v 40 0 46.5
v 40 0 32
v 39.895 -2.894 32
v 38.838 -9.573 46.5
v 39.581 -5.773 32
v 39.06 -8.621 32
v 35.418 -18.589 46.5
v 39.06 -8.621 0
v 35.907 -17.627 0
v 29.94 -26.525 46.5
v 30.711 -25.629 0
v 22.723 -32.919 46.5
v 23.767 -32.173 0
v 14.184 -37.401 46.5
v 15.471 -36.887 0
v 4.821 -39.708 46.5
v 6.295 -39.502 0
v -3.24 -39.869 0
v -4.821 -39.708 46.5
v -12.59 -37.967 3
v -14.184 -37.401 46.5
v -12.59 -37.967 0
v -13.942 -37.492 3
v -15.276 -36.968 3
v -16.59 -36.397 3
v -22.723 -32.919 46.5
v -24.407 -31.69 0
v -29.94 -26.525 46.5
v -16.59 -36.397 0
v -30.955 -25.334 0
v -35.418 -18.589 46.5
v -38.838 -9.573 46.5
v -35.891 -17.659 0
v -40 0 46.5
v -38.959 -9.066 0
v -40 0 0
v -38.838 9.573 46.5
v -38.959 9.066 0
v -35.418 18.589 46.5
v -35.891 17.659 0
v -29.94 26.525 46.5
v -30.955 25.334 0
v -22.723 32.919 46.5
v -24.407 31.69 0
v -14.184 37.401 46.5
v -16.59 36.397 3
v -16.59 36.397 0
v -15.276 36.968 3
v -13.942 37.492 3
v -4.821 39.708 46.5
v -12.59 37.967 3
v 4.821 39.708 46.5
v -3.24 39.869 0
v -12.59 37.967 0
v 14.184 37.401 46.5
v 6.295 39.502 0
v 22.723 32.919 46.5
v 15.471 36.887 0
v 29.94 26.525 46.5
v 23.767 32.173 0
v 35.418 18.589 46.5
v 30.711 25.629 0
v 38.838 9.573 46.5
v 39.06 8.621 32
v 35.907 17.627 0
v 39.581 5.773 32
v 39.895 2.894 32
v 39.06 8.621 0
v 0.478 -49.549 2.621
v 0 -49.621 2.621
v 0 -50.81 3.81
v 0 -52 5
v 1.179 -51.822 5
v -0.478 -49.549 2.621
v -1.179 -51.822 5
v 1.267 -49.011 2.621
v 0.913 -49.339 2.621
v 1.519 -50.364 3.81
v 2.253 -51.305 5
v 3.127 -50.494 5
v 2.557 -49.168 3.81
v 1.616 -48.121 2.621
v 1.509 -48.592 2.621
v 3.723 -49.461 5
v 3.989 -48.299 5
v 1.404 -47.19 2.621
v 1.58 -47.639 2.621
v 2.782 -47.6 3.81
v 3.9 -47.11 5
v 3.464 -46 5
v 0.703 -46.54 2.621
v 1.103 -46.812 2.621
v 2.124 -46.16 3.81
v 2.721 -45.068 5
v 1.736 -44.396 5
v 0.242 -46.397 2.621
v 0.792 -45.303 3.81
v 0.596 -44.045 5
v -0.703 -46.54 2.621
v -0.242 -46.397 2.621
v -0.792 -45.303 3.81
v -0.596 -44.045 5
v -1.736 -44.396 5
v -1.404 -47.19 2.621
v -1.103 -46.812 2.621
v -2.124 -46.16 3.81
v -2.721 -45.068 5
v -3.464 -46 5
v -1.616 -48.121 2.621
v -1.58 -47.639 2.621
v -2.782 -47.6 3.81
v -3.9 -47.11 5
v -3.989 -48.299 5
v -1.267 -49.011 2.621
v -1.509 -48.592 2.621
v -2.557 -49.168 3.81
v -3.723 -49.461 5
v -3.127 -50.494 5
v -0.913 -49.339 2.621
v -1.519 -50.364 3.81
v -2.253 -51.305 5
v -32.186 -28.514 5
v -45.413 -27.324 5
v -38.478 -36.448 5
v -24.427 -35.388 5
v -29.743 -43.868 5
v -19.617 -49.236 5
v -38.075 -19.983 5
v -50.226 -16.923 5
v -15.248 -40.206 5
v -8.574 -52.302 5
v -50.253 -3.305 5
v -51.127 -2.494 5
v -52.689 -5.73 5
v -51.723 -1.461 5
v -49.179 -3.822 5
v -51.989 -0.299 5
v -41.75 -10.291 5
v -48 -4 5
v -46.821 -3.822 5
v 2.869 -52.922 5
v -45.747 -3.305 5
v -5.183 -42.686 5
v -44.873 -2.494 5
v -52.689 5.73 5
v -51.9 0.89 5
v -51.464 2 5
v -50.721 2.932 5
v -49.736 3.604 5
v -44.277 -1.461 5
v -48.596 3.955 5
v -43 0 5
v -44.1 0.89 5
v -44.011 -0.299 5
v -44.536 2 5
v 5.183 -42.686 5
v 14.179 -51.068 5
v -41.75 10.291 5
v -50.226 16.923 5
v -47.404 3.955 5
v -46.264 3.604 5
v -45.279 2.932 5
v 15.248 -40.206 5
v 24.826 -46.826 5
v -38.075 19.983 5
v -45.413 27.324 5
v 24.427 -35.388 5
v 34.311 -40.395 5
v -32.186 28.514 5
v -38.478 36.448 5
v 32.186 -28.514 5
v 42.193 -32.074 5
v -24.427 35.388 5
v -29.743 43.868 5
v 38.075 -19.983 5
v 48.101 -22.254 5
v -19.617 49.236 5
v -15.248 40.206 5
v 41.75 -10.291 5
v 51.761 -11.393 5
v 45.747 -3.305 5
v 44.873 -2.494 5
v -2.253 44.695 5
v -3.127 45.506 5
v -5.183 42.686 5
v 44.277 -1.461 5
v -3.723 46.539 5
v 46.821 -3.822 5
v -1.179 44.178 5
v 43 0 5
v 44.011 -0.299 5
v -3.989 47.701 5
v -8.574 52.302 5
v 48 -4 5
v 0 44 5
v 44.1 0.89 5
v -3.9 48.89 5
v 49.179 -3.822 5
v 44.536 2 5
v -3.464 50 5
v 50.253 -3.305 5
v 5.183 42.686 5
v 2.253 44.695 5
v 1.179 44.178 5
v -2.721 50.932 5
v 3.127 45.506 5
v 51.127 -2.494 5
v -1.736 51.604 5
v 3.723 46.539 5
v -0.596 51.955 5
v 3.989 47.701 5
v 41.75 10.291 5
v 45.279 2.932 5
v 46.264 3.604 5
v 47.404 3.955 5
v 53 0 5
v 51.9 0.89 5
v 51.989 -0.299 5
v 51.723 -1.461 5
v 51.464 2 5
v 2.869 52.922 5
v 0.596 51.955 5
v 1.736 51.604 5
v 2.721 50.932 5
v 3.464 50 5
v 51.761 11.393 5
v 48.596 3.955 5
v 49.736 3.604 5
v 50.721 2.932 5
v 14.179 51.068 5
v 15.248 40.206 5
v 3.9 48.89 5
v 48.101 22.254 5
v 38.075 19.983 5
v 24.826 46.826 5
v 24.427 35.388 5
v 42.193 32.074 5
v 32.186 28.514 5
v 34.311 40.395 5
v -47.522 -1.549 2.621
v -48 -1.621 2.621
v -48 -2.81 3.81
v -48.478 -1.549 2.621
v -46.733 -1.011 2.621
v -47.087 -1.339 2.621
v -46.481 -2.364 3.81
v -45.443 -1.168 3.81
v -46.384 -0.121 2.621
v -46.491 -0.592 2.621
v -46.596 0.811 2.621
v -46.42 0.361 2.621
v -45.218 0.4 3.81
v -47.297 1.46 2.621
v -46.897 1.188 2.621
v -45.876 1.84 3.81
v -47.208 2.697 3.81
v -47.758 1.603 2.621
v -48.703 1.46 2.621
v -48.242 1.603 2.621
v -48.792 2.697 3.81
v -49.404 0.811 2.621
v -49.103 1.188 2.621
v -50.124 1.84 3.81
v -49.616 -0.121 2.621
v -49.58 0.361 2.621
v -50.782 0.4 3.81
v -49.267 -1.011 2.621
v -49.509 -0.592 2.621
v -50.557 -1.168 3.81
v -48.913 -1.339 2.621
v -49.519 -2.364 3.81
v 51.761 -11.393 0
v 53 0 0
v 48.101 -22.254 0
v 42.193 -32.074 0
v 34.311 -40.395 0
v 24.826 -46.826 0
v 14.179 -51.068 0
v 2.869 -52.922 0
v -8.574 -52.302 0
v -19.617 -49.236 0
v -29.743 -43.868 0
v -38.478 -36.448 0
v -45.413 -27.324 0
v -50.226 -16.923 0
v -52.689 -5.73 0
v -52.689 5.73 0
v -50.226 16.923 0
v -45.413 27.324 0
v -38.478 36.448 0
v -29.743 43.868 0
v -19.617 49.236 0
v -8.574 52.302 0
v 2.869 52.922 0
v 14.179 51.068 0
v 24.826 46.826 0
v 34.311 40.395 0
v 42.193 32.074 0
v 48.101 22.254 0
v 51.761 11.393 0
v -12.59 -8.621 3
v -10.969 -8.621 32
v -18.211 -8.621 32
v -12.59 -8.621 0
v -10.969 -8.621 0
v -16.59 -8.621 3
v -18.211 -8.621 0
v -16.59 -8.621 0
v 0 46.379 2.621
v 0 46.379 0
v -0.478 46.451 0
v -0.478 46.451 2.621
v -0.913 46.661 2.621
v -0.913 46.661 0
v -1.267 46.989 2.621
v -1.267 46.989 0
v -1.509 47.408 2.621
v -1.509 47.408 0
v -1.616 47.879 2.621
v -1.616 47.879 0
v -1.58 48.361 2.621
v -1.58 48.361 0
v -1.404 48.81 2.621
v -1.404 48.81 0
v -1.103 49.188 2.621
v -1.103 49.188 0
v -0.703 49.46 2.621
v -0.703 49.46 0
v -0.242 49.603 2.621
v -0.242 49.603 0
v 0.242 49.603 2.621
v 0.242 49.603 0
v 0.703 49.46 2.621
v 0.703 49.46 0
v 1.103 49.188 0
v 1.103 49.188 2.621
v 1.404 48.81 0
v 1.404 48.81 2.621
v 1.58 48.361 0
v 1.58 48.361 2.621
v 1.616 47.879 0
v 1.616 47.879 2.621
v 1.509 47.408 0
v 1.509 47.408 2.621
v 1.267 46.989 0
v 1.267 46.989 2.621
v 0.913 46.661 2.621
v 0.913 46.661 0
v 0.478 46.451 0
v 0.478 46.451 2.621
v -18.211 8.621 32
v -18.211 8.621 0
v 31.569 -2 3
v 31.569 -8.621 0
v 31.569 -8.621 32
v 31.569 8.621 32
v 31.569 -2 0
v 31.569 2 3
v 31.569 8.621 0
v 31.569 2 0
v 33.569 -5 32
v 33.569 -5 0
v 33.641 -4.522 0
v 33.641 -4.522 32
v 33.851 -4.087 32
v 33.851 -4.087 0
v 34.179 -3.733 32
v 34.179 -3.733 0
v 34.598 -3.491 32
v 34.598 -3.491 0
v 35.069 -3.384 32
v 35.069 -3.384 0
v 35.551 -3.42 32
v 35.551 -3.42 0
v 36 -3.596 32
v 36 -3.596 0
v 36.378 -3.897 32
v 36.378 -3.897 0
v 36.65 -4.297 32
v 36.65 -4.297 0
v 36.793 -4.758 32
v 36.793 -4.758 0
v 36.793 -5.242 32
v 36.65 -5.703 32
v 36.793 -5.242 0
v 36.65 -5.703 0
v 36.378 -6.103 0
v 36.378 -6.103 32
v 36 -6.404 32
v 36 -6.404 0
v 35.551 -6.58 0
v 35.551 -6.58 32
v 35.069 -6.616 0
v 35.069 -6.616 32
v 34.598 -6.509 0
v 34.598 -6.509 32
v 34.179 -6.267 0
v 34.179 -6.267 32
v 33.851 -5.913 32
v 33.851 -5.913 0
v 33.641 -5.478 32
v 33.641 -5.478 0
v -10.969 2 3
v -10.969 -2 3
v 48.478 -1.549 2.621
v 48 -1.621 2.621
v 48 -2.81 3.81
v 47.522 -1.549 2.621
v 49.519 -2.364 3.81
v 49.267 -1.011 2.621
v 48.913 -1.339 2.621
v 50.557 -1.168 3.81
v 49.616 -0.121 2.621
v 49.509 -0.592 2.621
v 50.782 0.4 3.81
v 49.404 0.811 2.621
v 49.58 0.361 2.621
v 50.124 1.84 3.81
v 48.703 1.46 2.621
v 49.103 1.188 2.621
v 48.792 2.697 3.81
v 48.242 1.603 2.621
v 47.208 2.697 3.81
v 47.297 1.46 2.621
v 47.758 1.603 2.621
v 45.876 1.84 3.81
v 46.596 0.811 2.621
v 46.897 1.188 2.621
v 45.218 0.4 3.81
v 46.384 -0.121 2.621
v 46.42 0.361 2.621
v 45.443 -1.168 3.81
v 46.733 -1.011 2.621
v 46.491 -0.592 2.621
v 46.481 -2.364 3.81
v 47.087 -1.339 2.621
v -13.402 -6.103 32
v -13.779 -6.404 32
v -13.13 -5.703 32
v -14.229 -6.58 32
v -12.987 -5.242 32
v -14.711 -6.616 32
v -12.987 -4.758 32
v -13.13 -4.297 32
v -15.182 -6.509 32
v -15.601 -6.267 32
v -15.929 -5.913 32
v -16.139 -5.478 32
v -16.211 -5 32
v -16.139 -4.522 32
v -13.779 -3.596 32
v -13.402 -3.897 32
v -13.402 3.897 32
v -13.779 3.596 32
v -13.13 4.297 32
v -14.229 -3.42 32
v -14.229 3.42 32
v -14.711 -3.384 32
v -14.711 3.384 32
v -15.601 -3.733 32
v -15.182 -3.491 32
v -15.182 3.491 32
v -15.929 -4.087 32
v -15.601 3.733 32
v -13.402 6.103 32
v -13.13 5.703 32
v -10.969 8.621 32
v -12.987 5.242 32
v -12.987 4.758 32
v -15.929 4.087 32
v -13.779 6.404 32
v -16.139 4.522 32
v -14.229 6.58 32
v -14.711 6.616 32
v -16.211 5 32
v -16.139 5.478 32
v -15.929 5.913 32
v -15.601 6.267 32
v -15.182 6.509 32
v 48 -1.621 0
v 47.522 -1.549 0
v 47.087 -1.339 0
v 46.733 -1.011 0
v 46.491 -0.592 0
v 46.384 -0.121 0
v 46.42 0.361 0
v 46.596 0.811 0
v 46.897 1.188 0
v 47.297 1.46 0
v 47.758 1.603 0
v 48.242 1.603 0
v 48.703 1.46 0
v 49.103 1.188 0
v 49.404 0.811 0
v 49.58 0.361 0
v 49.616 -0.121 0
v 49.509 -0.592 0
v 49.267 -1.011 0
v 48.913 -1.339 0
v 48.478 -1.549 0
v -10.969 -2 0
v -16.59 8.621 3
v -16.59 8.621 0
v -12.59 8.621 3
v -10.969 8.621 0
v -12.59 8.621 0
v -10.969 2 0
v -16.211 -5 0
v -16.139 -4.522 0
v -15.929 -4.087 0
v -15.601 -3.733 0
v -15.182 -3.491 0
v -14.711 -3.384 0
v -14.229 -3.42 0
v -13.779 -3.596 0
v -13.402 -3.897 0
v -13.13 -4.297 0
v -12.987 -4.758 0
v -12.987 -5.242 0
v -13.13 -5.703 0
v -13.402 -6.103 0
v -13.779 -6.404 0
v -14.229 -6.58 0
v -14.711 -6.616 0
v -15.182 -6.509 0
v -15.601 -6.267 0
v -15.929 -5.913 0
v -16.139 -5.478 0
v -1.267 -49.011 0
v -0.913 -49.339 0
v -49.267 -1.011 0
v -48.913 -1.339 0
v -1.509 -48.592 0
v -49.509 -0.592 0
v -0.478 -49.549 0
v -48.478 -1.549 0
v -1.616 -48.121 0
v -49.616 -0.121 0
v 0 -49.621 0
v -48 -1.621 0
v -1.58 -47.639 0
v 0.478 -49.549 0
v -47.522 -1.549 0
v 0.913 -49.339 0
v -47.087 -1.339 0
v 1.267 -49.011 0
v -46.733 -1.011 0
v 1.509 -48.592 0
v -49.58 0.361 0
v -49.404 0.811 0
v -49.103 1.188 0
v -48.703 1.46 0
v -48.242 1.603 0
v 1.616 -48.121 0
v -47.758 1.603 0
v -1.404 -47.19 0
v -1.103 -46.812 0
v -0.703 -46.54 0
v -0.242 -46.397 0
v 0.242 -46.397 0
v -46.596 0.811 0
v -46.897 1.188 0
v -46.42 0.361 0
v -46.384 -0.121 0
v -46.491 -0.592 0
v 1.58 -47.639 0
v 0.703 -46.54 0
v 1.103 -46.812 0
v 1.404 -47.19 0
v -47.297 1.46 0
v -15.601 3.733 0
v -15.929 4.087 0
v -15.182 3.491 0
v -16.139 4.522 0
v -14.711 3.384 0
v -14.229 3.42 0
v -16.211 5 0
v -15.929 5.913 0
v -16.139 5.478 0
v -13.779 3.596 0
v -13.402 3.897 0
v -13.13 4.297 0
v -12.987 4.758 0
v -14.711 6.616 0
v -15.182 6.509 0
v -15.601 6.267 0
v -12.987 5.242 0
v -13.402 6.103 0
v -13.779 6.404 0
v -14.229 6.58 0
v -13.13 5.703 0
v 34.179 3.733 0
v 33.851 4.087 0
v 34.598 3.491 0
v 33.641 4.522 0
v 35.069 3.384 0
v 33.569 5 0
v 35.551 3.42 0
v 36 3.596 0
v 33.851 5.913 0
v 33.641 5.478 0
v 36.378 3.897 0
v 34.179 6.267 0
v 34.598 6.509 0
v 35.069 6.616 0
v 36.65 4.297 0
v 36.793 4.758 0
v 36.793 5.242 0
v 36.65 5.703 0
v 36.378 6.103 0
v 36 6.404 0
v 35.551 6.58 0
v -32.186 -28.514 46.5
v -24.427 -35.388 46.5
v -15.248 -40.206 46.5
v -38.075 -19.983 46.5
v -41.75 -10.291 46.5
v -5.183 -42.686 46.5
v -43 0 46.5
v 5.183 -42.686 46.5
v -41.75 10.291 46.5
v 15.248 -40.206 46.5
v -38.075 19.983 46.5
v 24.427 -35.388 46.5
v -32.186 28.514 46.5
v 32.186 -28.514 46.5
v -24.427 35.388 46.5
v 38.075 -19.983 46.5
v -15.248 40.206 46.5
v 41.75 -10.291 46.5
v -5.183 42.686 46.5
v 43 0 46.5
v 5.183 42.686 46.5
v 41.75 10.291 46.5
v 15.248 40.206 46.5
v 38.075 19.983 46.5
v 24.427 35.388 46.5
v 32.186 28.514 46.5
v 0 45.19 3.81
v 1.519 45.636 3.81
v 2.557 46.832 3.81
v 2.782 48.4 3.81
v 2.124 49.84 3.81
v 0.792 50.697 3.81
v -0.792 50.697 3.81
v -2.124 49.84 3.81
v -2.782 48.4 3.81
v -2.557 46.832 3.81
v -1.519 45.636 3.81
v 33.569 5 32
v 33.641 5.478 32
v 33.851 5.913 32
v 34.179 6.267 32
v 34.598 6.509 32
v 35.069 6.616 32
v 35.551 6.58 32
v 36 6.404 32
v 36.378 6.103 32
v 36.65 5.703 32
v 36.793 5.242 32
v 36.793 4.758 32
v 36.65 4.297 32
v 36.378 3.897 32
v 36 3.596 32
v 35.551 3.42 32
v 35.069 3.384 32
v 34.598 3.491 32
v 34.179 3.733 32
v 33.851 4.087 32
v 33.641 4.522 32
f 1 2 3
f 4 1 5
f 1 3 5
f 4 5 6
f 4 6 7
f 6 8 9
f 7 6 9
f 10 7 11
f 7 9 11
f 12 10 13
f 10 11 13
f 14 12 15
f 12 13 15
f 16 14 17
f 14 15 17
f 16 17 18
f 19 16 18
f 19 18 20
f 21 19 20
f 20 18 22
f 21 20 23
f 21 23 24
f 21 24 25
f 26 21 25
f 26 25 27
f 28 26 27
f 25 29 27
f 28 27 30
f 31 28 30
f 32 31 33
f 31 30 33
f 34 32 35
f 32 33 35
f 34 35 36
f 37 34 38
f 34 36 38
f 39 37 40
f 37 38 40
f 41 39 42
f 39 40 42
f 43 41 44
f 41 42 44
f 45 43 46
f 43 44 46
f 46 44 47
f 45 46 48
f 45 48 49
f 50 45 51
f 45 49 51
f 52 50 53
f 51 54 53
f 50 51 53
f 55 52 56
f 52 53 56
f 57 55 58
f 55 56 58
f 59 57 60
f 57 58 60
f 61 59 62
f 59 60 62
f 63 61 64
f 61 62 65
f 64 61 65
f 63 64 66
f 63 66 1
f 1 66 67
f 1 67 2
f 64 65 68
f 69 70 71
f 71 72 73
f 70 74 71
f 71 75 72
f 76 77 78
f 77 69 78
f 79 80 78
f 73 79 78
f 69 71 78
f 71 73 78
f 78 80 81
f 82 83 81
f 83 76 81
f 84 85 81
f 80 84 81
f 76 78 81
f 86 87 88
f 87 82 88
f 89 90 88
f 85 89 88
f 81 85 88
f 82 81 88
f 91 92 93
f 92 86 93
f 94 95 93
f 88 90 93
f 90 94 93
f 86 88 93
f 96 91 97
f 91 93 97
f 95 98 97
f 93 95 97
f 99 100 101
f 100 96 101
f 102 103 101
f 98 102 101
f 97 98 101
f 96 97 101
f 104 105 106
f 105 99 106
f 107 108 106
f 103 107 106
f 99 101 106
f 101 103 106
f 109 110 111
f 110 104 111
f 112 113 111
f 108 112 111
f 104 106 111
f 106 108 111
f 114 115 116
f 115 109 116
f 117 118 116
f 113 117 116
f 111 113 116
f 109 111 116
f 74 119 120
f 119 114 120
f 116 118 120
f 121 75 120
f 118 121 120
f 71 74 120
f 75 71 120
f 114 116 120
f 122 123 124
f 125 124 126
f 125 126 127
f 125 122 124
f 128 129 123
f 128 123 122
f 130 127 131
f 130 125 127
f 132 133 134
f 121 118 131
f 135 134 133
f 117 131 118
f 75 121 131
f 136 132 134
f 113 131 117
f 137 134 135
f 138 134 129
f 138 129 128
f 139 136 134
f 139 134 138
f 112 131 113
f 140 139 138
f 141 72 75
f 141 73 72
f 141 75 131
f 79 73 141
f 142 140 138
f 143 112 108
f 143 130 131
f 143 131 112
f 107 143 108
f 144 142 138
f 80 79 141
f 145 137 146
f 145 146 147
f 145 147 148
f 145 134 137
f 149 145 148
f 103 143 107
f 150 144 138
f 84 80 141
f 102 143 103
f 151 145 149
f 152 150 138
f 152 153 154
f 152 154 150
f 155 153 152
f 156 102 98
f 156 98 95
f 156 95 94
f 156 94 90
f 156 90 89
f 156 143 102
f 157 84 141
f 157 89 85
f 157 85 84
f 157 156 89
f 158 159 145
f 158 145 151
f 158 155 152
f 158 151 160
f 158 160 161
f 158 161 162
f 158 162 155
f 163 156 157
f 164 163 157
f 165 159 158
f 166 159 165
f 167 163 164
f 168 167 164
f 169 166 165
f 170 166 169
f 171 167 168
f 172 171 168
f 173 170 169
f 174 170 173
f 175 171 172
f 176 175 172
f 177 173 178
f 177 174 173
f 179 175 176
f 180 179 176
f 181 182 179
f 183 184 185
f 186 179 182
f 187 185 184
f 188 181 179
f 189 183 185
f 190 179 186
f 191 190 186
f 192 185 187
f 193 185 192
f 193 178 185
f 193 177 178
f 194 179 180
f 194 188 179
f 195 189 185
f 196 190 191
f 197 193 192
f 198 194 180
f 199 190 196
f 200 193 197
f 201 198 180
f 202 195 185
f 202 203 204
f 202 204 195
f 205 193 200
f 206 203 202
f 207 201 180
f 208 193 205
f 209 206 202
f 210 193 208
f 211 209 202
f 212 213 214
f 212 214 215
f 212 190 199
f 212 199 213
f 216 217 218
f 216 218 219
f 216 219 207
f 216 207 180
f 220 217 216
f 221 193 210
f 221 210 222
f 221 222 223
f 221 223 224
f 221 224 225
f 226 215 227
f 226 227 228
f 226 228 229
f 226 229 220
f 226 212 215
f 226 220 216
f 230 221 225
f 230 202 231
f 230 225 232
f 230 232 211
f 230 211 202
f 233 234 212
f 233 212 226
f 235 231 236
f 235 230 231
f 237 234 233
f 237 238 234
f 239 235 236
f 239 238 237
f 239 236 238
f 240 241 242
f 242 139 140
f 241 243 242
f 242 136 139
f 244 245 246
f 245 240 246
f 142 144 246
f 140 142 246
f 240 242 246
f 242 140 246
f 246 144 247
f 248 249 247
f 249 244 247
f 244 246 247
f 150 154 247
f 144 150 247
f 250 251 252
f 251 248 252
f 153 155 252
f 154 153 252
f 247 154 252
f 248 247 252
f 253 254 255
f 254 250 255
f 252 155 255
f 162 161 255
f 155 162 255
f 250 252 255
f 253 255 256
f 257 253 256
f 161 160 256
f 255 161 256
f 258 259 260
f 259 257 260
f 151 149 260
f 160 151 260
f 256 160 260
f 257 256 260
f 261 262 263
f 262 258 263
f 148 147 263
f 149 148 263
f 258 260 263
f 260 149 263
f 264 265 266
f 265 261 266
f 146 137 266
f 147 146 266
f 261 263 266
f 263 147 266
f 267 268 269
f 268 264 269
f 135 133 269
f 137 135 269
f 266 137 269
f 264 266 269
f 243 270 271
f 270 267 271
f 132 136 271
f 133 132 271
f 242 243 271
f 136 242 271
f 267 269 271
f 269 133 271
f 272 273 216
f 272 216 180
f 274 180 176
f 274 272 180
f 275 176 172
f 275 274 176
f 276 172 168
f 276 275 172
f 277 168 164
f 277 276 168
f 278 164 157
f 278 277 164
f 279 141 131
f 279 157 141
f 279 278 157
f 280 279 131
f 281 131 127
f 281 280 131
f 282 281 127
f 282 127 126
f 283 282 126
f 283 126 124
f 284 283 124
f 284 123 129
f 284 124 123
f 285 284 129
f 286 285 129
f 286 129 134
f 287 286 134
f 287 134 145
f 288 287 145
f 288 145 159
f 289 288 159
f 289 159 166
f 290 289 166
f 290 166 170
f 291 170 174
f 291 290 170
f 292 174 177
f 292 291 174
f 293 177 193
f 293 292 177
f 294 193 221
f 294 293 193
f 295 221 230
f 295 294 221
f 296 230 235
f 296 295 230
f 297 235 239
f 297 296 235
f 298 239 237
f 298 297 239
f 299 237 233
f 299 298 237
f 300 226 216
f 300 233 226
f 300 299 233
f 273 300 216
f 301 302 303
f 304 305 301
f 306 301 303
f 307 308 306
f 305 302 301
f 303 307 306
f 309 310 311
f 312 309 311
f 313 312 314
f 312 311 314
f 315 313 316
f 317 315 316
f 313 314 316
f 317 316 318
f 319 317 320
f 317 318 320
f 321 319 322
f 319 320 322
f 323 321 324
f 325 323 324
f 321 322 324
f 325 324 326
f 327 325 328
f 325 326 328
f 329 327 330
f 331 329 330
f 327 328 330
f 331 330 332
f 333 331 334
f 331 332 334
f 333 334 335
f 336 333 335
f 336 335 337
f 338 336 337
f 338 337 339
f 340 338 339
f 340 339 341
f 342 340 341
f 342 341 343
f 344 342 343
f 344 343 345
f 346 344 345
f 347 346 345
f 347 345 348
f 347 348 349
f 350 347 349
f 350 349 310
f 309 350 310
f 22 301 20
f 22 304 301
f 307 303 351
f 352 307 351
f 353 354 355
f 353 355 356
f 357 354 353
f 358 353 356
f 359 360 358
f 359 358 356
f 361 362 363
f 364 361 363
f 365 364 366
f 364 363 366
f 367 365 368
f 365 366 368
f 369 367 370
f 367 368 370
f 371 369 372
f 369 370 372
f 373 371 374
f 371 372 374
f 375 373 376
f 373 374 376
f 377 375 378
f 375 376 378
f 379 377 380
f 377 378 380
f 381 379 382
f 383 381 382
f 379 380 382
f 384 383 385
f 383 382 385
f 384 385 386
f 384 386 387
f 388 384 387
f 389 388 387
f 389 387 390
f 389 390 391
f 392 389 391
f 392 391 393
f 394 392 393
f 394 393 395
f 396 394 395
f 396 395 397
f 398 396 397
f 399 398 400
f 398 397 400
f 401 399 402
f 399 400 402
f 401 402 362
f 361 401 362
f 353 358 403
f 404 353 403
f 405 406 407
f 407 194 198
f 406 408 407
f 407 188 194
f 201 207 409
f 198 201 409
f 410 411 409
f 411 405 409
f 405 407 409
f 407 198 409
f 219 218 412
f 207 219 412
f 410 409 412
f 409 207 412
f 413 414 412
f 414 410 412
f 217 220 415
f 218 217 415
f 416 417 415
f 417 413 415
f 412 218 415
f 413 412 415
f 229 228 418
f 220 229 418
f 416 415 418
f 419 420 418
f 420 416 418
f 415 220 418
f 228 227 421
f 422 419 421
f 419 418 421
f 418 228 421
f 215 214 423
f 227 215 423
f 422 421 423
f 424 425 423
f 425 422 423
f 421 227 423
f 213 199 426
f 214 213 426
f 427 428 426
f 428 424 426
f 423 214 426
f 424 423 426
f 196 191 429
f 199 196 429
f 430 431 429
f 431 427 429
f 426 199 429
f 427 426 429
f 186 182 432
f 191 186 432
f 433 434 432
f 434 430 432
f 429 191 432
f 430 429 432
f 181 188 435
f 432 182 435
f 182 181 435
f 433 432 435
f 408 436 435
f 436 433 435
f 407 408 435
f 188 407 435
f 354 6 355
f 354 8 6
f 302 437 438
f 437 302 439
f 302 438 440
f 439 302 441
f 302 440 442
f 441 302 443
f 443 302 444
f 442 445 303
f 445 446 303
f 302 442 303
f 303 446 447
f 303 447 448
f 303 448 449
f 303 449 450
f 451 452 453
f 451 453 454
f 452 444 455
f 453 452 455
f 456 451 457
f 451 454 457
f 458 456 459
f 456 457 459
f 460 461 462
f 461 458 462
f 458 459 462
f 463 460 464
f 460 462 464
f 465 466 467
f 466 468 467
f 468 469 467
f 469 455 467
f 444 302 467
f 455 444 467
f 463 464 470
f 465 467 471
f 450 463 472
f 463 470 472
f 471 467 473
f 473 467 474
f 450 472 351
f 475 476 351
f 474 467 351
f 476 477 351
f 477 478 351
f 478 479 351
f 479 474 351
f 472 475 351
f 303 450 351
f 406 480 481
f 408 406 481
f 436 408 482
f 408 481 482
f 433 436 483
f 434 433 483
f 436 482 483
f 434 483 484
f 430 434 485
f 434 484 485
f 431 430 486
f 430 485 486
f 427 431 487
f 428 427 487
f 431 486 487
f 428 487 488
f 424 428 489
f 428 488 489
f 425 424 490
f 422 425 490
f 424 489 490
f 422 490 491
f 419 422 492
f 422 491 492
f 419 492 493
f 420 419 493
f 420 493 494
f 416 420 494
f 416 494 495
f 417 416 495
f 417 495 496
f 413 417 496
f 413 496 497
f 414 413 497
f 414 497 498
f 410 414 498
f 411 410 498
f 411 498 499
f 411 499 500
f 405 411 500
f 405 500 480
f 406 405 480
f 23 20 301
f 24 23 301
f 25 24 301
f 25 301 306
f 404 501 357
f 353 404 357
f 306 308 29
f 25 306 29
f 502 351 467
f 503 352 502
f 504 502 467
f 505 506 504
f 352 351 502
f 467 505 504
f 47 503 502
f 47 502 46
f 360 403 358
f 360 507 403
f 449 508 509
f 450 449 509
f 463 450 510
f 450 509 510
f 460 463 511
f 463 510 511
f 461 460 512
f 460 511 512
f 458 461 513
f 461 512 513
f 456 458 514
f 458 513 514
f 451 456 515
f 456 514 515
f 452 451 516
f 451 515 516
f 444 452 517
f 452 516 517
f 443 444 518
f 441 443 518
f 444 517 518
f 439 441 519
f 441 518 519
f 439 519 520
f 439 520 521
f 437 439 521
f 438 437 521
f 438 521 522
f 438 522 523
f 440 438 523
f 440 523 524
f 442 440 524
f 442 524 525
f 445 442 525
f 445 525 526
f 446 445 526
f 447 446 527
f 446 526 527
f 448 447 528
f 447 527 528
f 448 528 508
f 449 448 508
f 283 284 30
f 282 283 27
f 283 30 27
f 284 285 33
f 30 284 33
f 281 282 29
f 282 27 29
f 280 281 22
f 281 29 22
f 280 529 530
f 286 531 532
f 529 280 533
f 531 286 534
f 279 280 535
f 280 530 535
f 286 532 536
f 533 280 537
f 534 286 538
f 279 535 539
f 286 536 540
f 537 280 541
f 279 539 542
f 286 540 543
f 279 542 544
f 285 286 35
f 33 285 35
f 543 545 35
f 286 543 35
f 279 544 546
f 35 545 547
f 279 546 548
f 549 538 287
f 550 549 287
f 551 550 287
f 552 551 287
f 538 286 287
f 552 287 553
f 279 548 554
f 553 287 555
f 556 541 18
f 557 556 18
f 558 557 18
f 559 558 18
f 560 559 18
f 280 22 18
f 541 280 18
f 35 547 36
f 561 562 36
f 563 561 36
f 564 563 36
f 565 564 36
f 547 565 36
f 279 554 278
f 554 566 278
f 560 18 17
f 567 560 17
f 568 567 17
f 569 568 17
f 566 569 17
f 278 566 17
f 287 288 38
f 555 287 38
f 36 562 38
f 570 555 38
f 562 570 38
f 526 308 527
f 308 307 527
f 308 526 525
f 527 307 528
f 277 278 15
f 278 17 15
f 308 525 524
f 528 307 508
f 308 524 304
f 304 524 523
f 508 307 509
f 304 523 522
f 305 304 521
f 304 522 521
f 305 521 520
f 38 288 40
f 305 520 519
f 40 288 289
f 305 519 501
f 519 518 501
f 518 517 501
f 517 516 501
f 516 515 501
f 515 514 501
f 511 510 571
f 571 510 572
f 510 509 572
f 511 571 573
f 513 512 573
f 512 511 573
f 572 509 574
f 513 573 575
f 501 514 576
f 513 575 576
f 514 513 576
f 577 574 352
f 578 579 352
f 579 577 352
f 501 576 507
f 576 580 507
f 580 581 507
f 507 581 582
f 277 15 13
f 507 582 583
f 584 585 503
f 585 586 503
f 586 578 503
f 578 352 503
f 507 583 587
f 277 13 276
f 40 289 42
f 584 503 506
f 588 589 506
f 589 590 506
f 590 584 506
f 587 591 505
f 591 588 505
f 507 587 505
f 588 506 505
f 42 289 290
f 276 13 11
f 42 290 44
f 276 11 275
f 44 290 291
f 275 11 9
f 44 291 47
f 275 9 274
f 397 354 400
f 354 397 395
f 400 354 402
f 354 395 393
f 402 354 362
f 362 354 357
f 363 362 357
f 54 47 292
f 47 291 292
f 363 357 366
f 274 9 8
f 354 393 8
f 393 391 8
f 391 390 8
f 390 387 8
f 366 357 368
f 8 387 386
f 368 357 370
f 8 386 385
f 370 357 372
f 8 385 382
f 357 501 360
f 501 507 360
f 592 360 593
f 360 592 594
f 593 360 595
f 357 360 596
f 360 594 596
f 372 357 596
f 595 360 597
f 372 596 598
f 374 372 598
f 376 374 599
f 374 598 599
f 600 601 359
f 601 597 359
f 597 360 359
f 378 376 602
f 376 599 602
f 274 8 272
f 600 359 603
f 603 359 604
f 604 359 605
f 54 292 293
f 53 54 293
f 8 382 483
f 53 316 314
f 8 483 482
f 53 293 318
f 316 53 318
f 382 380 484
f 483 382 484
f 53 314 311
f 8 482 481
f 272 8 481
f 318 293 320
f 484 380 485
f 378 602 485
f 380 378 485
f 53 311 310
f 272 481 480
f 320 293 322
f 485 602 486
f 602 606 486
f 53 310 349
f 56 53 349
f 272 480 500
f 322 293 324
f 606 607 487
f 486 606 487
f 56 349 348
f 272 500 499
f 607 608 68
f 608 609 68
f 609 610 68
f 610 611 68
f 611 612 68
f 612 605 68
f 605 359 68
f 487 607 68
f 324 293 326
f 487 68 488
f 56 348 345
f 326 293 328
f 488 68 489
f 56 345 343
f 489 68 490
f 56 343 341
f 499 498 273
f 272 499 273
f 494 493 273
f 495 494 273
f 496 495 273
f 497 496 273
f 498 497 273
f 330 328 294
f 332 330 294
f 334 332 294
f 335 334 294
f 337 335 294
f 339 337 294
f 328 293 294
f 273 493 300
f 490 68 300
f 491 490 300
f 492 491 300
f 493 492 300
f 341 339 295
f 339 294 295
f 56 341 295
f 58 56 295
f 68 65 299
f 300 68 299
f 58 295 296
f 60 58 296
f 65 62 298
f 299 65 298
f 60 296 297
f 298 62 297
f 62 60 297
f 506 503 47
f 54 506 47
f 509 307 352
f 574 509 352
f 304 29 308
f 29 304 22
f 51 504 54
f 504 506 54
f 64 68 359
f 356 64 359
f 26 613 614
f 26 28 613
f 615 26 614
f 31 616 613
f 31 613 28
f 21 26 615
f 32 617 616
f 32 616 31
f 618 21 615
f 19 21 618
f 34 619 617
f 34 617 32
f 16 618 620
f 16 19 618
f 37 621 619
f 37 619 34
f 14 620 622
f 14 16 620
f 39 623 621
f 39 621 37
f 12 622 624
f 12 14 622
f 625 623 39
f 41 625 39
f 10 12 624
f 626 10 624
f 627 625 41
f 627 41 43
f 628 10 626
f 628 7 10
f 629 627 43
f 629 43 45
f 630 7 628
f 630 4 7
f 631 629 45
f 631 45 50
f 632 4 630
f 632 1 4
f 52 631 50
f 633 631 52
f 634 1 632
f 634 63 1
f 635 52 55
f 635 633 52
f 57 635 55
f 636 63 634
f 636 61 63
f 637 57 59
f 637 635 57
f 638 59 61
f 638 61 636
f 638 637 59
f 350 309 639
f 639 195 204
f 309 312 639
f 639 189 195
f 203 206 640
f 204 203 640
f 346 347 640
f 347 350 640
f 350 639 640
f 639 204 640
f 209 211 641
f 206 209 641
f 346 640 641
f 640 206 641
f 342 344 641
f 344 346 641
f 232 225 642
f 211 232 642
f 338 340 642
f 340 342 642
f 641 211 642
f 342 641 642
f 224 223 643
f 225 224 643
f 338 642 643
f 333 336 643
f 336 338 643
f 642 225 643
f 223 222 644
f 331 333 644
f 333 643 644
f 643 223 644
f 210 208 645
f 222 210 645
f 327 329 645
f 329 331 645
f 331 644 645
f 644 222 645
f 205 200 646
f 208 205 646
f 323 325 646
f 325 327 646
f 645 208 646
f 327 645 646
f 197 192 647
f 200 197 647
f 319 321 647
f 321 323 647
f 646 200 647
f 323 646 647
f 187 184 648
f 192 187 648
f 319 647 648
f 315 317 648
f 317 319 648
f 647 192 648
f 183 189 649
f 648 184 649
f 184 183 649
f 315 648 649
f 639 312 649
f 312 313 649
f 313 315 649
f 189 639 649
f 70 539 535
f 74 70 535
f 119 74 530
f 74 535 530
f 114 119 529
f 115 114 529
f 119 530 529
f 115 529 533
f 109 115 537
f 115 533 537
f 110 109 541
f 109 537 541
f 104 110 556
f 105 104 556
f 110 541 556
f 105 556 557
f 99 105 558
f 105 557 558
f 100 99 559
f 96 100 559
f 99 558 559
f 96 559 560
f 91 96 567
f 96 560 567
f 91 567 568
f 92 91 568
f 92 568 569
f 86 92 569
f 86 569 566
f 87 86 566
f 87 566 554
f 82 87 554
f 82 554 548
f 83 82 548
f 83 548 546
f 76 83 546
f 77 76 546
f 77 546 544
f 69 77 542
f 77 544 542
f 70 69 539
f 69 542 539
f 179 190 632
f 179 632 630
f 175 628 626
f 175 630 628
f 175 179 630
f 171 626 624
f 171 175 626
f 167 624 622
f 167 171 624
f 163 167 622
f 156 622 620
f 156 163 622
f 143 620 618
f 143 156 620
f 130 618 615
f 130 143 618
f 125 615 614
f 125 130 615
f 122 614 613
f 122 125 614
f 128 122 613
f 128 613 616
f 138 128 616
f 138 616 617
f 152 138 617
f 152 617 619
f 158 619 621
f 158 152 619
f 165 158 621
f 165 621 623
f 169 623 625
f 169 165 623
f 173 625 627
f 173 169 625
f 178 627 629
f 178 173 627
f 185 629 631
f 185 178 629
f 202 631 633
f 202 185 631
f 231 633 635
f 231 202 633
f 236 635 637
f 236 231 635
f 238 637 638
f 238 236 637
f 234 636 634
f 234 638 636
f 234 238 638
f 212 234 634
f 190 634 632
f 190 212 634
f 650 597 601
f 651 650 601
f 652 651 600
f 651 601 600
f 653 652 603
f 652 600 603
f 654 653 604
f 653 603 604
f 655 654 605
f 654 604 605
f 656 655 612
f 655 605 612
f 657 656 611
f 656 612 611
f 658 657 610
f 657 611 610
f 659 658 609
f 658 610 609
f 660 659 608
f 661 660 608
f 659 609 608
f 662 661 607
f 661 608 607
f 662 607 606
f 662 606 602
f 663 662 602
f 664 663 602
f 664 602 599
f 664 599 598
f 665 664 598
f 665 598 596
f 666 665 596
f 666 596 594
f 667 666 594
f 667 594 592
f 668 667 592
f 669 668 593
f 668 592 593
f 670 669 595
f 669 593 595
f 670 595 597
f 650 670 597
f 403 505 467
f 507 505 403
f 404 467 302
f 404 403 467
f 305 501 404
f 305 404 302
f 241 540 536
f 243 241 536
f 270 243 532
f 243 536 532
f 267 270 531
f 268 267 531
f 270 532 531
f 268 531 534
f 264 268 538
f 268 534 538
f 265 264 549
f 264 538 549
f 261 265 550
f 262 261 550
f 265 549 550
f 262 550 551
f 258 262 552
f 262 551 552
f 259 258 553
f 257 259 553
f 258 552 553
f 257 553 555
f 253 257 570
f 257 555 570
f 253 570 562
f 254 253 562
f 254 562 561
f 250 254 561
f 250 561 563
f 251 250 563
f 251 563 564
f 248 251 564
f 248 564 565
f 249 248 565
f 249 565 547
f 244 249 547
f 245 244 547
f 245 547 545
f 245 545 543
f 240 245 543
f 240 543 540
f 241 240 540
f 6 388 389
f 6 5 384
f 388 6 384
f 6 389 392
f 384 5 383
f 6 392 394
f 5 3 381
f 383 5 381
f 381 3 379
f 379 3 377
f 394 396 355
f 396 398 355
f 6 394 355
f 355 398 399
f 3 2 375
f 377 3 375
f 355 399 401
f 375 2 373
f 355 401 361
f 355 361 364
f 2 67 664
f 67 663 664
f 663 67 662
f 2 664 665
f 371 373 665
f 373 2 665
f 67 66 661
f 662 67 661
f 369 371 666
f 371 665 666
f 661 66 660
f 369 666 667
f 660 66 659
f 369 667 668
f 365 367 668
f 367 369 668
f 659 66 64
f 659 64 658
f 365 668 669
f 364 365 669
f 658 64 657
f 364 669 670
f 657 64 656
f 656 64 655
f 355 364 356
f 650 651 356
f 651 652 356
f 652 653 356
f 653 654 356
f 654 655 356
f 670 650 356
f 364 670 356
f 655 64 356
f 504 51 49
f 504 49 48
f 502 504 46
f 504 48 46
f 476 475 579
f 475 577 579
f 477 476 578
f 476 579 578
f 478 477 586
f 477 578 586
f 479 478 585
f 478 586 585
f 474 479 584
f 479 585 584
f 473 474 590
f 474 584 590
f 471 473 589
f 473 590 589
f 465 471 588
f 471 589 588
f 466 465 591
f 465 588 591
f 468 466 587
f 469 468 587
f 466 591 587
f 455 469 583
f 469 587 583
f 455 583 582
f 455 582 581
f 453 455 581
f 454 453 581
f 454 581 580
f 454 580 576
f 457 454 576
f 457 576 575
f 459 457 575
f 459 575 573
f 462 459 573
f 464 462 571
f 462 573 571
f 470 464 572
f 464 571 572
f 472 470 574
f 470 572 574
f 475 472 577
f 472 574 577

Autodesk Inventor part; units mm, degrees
ref_plane "YZ Plane" through (0, 0, 0) normal (1, 0, 0) x (0, 1, 0)
ref_plane "XZ Plane" through (0, 0, 0) normal (0, 1, 0) x (-1, 0, 0)
ref_plane "XY Plane" through (0, 0, 0) normal (0, 0, 1) x (1, 0, 0)
sketch "Szkic1" plane through (0, 0, 0) normal (0, 0, 1) x (1, 0, 0)
  circle A0 centre (0, 0) radius 40
  circle A1 centre (0, 0) radius 53
  dimension "d0" = 80
  dimension "d1" = 13
extrude "Wyciągnięcie proste1" add sketch "Szkic1" along normal blind 5
sketch "Szkic2" plane through (0, 0, 5) normal (0, 0, 1) x (1, 0, 0)
  circle A0 centre (0, 0) radius 40 projected
  circle A1 centre (0, 0) radius 43
  dimension "d4" = 3
extrude "Wyciągnięcie proste2" add sketch "Szkic2" along normal blind 41.5
sketch "Szkic3" plane through (0, 0, 5) normal (0, 0, 1) x (1, 0, 0)
  circle A0 centre (0, 0) radius 43 projected
  line L0 (0, 43) -> (0, 53)
  circle A1 centre (0, 0) radius 53 projected
  line L1 (43, 0) -> (53, 0)
  line L2 (0, -43) -> (0, -53)
  line L3 (-43, 0) -> (-53, 0)
  point P0 (0, 48)
  point P1 (-48, 0)
  point P2 (0, -48)
  point P3 (48, 0)
hole "Otwór1" at (0, 48, 5) at (-48, 0, 5) at (0, -48, 5) at (48, 0, 5) direction (0, 0, -1) diameter 3.242 end through all countersink diameter 8 countersink angle 90 thread size "M4x0.7" designation "M4" class "6H" standard "GB Metric profile"
sketch "Szkic8" plane through (0, 0, 0) normal (0, 0, -1) x (-1, 0, 0)
  circle A0 centre (0, 0) radius 10.75
  line L0 (0, 0) -> (17, 0)
  line L1 (17, 0) -> (14.59, 0)
  line L2 (14.59, 0) -> (14.59, 5)
  line L3 (14.59, 0) -> (14.59, -5)
  circle A1 centre (14.59, 5) radius 1.621
  circle A2 centre (14.59, -5) radius 1.621
  line L4 (14.59, 5) -> (-35.19, 5)
  line L5 (14.59, -5) -> (-35.19, -5)
  circle A3 centre (-35.19, 5) radius 1.621
  circle A4 centre (-35.19, -5) radius 1.621
  line L6 (-33.569, -5) -> (-31.569, -5)
  line L7 (-31.569, -5) -> (-31.569, 5)
  line L8 (-35.19, 6.621) -> (-35.19, 8.621)
  line L9 (-35.19, 8.621) -> (-31.569, 8.621)
  line L10 (-31.569, 8.621) -> (-31.569, 5)
  line L11 (-36.811, 5) -> (-38.811, 5)
  line L12 (-35.19, -6.621) -> (-35.19, -8.621)
  line L13 (-35.19, -8.621) -> (-31.569, -8.621)
  line L14 (-31.569, -8.621) -> (-31.569, -5)
  line L15 (-35.19, -8.621) -> (-38.811, -8.621)
  line L16 (-38.811, 5) -> (-38.811, 8.621)
  line L17 (-38.811, 8.621) -> (-35.19, 8.621)
  line L18 (12.969, -5) -> (10.969, -5)
  line L19 (14.59, -6.621) -> (14.59, -8.621)
  line L20 (10.969, -5) -> (10.969, -8.621)
  line L21 (10.969, -8.621) -> (14.59, -8.621)
  line L22 (14.59, 6.621) -> (14.59, 8.621)
  line L23 (14.59, 8.621) -> (10.969, 8.621)
  line L24 (10.969, 8.621) -> (10.969, -5)
  line L25 (16.211, -5) -> (18.211, -5)
  line L26 (14.59, -8.621) -> (18.211, -8.621)
  line L27 (18.211, -8.621) -> (18.211, 8.621)
  line L28 (18.211, 8.621) -> (14.59, 8.621)
  circle A5 centre (0, 0) radius 40 projected
  line L29 (-38.811, -8.621) -> (-39.0599, -8.621)
  line L30 (-38.811, 8.621) -> (-39.0599, 8.621)
  line L31 (-31.569, 8.621) -> (-30.569, 8.621)
  line L32 (-30.569, 8.621) -> (-30.569, -8.621)
  line L33 (-30.569, -8.621) -> (-31.569, -8.621)
  dimension "d59" = 3.242
  dimension "d54" = 21.5
  dimension "d55" = 17
  dimension "d56" = 2.41
  dimension "d57" = 5
  dimension "d58" = 5
  dimension "d60" = 3.242
  dimension "d61" = 49.78
  dimension "d62" = 3.242
  dimension "d63" = 3.242
  dimension "d64" = 2
  dimension "d66" = 2
  dimension "d67" = 2
  dimension "d68" = 2
  dimension "d69" = 2
  dimension "d70" = 2
  dimension "d71" = 2
  dimension "d74" = 49.78
  dimension "d87" = 1
extrude "Wyciągnięcie proste6" add sketch "Szkic8" against normal blind 32 contours L24 L4 A1 L2 L0 | L0 L3 A2 L5 L24 | L24 L23 L22 A1 L4 | L5 A2 L19 L21 L20 | L2 A1 L22 L28 L27 L25 A2 L3 | L7 L5 A4 L12 L15 L29 A5 L30 L16 L11 A3 L4 | L4 A3 L8 L9 L10 | L14 L13 L12 A4 L5 | A2 L25 L27 L26 L19 | A3 L11 L16 L17 L8
sketch "Szkic9" plane through (0, 0, 0) normal (0, 0, -1) x (-1, 0, 0)
  line L0 (11.0032, 0) -> (10.969, -1.9997)
  line L1 (10.969, -8.621) -> (10.969, 8.621) projected
  line L2 (10.969, -1.9997) -> (10.969, 2.0003)
  line L3 (10.969, 2.0003) -> (-31.569, 2.0003)
  line L4 (-31.569, -8.621) -> (-31.569, 8.621) projected
  line L5 (10.969, -1.9997) -> (-31.569, -1.9997)
  circle A0 centre (14.59, -5) radius 1.621 projected
  line L6 (14.59, -5) -> (14.59, -8.621)
  line L7 (18.211, -8.621) -> (10.969, -8.621) projected
  line L8 (14.59, -8.621) -> (12.59, -8.621)
  line L9 (12.59, -8.621) -> (16.59, -8.621)
  line L10 (16.59, -8.621) -> (16.59, -36.3974)
  arc A1 (-39.0599, -8.621) -> (-39.0599, 8.621) centre (0, 0) ccw projected
  line L11 (12.59, -8.621) -> (12.59, -37.967)
  line L12 (10.969, 8.621) -> (18.211, 8.621) projected
  line L13 (12.59, 8.621) -> (12.59, 45.8086)
  line L14 (12.59, 8.621) -> (49.7776, 8.621) construction
  line L15 (16.59, 8.621) -> (16.59, 43)
  point P0 (16.59, 36.3974)
  point P1 (12.59, 37.967)
  dimension "d75" = 2
  dimension "d76" = 4
  dimension "d77" = 2
  dimension "d78" = 4
  dimension "d79" = 90
extrude "Wyciągnięcie proste7" add sketch "Szkic9" against normal blind 3 contours L5 L4 L3 L1 | L7 L10 A1 L11 | L13 A1 L15 L12
equation "\"d62\" = d59"
equation "\"d63\" = d60"
equation "\"d74\" = d61"
properties part number "Podstawa1"
